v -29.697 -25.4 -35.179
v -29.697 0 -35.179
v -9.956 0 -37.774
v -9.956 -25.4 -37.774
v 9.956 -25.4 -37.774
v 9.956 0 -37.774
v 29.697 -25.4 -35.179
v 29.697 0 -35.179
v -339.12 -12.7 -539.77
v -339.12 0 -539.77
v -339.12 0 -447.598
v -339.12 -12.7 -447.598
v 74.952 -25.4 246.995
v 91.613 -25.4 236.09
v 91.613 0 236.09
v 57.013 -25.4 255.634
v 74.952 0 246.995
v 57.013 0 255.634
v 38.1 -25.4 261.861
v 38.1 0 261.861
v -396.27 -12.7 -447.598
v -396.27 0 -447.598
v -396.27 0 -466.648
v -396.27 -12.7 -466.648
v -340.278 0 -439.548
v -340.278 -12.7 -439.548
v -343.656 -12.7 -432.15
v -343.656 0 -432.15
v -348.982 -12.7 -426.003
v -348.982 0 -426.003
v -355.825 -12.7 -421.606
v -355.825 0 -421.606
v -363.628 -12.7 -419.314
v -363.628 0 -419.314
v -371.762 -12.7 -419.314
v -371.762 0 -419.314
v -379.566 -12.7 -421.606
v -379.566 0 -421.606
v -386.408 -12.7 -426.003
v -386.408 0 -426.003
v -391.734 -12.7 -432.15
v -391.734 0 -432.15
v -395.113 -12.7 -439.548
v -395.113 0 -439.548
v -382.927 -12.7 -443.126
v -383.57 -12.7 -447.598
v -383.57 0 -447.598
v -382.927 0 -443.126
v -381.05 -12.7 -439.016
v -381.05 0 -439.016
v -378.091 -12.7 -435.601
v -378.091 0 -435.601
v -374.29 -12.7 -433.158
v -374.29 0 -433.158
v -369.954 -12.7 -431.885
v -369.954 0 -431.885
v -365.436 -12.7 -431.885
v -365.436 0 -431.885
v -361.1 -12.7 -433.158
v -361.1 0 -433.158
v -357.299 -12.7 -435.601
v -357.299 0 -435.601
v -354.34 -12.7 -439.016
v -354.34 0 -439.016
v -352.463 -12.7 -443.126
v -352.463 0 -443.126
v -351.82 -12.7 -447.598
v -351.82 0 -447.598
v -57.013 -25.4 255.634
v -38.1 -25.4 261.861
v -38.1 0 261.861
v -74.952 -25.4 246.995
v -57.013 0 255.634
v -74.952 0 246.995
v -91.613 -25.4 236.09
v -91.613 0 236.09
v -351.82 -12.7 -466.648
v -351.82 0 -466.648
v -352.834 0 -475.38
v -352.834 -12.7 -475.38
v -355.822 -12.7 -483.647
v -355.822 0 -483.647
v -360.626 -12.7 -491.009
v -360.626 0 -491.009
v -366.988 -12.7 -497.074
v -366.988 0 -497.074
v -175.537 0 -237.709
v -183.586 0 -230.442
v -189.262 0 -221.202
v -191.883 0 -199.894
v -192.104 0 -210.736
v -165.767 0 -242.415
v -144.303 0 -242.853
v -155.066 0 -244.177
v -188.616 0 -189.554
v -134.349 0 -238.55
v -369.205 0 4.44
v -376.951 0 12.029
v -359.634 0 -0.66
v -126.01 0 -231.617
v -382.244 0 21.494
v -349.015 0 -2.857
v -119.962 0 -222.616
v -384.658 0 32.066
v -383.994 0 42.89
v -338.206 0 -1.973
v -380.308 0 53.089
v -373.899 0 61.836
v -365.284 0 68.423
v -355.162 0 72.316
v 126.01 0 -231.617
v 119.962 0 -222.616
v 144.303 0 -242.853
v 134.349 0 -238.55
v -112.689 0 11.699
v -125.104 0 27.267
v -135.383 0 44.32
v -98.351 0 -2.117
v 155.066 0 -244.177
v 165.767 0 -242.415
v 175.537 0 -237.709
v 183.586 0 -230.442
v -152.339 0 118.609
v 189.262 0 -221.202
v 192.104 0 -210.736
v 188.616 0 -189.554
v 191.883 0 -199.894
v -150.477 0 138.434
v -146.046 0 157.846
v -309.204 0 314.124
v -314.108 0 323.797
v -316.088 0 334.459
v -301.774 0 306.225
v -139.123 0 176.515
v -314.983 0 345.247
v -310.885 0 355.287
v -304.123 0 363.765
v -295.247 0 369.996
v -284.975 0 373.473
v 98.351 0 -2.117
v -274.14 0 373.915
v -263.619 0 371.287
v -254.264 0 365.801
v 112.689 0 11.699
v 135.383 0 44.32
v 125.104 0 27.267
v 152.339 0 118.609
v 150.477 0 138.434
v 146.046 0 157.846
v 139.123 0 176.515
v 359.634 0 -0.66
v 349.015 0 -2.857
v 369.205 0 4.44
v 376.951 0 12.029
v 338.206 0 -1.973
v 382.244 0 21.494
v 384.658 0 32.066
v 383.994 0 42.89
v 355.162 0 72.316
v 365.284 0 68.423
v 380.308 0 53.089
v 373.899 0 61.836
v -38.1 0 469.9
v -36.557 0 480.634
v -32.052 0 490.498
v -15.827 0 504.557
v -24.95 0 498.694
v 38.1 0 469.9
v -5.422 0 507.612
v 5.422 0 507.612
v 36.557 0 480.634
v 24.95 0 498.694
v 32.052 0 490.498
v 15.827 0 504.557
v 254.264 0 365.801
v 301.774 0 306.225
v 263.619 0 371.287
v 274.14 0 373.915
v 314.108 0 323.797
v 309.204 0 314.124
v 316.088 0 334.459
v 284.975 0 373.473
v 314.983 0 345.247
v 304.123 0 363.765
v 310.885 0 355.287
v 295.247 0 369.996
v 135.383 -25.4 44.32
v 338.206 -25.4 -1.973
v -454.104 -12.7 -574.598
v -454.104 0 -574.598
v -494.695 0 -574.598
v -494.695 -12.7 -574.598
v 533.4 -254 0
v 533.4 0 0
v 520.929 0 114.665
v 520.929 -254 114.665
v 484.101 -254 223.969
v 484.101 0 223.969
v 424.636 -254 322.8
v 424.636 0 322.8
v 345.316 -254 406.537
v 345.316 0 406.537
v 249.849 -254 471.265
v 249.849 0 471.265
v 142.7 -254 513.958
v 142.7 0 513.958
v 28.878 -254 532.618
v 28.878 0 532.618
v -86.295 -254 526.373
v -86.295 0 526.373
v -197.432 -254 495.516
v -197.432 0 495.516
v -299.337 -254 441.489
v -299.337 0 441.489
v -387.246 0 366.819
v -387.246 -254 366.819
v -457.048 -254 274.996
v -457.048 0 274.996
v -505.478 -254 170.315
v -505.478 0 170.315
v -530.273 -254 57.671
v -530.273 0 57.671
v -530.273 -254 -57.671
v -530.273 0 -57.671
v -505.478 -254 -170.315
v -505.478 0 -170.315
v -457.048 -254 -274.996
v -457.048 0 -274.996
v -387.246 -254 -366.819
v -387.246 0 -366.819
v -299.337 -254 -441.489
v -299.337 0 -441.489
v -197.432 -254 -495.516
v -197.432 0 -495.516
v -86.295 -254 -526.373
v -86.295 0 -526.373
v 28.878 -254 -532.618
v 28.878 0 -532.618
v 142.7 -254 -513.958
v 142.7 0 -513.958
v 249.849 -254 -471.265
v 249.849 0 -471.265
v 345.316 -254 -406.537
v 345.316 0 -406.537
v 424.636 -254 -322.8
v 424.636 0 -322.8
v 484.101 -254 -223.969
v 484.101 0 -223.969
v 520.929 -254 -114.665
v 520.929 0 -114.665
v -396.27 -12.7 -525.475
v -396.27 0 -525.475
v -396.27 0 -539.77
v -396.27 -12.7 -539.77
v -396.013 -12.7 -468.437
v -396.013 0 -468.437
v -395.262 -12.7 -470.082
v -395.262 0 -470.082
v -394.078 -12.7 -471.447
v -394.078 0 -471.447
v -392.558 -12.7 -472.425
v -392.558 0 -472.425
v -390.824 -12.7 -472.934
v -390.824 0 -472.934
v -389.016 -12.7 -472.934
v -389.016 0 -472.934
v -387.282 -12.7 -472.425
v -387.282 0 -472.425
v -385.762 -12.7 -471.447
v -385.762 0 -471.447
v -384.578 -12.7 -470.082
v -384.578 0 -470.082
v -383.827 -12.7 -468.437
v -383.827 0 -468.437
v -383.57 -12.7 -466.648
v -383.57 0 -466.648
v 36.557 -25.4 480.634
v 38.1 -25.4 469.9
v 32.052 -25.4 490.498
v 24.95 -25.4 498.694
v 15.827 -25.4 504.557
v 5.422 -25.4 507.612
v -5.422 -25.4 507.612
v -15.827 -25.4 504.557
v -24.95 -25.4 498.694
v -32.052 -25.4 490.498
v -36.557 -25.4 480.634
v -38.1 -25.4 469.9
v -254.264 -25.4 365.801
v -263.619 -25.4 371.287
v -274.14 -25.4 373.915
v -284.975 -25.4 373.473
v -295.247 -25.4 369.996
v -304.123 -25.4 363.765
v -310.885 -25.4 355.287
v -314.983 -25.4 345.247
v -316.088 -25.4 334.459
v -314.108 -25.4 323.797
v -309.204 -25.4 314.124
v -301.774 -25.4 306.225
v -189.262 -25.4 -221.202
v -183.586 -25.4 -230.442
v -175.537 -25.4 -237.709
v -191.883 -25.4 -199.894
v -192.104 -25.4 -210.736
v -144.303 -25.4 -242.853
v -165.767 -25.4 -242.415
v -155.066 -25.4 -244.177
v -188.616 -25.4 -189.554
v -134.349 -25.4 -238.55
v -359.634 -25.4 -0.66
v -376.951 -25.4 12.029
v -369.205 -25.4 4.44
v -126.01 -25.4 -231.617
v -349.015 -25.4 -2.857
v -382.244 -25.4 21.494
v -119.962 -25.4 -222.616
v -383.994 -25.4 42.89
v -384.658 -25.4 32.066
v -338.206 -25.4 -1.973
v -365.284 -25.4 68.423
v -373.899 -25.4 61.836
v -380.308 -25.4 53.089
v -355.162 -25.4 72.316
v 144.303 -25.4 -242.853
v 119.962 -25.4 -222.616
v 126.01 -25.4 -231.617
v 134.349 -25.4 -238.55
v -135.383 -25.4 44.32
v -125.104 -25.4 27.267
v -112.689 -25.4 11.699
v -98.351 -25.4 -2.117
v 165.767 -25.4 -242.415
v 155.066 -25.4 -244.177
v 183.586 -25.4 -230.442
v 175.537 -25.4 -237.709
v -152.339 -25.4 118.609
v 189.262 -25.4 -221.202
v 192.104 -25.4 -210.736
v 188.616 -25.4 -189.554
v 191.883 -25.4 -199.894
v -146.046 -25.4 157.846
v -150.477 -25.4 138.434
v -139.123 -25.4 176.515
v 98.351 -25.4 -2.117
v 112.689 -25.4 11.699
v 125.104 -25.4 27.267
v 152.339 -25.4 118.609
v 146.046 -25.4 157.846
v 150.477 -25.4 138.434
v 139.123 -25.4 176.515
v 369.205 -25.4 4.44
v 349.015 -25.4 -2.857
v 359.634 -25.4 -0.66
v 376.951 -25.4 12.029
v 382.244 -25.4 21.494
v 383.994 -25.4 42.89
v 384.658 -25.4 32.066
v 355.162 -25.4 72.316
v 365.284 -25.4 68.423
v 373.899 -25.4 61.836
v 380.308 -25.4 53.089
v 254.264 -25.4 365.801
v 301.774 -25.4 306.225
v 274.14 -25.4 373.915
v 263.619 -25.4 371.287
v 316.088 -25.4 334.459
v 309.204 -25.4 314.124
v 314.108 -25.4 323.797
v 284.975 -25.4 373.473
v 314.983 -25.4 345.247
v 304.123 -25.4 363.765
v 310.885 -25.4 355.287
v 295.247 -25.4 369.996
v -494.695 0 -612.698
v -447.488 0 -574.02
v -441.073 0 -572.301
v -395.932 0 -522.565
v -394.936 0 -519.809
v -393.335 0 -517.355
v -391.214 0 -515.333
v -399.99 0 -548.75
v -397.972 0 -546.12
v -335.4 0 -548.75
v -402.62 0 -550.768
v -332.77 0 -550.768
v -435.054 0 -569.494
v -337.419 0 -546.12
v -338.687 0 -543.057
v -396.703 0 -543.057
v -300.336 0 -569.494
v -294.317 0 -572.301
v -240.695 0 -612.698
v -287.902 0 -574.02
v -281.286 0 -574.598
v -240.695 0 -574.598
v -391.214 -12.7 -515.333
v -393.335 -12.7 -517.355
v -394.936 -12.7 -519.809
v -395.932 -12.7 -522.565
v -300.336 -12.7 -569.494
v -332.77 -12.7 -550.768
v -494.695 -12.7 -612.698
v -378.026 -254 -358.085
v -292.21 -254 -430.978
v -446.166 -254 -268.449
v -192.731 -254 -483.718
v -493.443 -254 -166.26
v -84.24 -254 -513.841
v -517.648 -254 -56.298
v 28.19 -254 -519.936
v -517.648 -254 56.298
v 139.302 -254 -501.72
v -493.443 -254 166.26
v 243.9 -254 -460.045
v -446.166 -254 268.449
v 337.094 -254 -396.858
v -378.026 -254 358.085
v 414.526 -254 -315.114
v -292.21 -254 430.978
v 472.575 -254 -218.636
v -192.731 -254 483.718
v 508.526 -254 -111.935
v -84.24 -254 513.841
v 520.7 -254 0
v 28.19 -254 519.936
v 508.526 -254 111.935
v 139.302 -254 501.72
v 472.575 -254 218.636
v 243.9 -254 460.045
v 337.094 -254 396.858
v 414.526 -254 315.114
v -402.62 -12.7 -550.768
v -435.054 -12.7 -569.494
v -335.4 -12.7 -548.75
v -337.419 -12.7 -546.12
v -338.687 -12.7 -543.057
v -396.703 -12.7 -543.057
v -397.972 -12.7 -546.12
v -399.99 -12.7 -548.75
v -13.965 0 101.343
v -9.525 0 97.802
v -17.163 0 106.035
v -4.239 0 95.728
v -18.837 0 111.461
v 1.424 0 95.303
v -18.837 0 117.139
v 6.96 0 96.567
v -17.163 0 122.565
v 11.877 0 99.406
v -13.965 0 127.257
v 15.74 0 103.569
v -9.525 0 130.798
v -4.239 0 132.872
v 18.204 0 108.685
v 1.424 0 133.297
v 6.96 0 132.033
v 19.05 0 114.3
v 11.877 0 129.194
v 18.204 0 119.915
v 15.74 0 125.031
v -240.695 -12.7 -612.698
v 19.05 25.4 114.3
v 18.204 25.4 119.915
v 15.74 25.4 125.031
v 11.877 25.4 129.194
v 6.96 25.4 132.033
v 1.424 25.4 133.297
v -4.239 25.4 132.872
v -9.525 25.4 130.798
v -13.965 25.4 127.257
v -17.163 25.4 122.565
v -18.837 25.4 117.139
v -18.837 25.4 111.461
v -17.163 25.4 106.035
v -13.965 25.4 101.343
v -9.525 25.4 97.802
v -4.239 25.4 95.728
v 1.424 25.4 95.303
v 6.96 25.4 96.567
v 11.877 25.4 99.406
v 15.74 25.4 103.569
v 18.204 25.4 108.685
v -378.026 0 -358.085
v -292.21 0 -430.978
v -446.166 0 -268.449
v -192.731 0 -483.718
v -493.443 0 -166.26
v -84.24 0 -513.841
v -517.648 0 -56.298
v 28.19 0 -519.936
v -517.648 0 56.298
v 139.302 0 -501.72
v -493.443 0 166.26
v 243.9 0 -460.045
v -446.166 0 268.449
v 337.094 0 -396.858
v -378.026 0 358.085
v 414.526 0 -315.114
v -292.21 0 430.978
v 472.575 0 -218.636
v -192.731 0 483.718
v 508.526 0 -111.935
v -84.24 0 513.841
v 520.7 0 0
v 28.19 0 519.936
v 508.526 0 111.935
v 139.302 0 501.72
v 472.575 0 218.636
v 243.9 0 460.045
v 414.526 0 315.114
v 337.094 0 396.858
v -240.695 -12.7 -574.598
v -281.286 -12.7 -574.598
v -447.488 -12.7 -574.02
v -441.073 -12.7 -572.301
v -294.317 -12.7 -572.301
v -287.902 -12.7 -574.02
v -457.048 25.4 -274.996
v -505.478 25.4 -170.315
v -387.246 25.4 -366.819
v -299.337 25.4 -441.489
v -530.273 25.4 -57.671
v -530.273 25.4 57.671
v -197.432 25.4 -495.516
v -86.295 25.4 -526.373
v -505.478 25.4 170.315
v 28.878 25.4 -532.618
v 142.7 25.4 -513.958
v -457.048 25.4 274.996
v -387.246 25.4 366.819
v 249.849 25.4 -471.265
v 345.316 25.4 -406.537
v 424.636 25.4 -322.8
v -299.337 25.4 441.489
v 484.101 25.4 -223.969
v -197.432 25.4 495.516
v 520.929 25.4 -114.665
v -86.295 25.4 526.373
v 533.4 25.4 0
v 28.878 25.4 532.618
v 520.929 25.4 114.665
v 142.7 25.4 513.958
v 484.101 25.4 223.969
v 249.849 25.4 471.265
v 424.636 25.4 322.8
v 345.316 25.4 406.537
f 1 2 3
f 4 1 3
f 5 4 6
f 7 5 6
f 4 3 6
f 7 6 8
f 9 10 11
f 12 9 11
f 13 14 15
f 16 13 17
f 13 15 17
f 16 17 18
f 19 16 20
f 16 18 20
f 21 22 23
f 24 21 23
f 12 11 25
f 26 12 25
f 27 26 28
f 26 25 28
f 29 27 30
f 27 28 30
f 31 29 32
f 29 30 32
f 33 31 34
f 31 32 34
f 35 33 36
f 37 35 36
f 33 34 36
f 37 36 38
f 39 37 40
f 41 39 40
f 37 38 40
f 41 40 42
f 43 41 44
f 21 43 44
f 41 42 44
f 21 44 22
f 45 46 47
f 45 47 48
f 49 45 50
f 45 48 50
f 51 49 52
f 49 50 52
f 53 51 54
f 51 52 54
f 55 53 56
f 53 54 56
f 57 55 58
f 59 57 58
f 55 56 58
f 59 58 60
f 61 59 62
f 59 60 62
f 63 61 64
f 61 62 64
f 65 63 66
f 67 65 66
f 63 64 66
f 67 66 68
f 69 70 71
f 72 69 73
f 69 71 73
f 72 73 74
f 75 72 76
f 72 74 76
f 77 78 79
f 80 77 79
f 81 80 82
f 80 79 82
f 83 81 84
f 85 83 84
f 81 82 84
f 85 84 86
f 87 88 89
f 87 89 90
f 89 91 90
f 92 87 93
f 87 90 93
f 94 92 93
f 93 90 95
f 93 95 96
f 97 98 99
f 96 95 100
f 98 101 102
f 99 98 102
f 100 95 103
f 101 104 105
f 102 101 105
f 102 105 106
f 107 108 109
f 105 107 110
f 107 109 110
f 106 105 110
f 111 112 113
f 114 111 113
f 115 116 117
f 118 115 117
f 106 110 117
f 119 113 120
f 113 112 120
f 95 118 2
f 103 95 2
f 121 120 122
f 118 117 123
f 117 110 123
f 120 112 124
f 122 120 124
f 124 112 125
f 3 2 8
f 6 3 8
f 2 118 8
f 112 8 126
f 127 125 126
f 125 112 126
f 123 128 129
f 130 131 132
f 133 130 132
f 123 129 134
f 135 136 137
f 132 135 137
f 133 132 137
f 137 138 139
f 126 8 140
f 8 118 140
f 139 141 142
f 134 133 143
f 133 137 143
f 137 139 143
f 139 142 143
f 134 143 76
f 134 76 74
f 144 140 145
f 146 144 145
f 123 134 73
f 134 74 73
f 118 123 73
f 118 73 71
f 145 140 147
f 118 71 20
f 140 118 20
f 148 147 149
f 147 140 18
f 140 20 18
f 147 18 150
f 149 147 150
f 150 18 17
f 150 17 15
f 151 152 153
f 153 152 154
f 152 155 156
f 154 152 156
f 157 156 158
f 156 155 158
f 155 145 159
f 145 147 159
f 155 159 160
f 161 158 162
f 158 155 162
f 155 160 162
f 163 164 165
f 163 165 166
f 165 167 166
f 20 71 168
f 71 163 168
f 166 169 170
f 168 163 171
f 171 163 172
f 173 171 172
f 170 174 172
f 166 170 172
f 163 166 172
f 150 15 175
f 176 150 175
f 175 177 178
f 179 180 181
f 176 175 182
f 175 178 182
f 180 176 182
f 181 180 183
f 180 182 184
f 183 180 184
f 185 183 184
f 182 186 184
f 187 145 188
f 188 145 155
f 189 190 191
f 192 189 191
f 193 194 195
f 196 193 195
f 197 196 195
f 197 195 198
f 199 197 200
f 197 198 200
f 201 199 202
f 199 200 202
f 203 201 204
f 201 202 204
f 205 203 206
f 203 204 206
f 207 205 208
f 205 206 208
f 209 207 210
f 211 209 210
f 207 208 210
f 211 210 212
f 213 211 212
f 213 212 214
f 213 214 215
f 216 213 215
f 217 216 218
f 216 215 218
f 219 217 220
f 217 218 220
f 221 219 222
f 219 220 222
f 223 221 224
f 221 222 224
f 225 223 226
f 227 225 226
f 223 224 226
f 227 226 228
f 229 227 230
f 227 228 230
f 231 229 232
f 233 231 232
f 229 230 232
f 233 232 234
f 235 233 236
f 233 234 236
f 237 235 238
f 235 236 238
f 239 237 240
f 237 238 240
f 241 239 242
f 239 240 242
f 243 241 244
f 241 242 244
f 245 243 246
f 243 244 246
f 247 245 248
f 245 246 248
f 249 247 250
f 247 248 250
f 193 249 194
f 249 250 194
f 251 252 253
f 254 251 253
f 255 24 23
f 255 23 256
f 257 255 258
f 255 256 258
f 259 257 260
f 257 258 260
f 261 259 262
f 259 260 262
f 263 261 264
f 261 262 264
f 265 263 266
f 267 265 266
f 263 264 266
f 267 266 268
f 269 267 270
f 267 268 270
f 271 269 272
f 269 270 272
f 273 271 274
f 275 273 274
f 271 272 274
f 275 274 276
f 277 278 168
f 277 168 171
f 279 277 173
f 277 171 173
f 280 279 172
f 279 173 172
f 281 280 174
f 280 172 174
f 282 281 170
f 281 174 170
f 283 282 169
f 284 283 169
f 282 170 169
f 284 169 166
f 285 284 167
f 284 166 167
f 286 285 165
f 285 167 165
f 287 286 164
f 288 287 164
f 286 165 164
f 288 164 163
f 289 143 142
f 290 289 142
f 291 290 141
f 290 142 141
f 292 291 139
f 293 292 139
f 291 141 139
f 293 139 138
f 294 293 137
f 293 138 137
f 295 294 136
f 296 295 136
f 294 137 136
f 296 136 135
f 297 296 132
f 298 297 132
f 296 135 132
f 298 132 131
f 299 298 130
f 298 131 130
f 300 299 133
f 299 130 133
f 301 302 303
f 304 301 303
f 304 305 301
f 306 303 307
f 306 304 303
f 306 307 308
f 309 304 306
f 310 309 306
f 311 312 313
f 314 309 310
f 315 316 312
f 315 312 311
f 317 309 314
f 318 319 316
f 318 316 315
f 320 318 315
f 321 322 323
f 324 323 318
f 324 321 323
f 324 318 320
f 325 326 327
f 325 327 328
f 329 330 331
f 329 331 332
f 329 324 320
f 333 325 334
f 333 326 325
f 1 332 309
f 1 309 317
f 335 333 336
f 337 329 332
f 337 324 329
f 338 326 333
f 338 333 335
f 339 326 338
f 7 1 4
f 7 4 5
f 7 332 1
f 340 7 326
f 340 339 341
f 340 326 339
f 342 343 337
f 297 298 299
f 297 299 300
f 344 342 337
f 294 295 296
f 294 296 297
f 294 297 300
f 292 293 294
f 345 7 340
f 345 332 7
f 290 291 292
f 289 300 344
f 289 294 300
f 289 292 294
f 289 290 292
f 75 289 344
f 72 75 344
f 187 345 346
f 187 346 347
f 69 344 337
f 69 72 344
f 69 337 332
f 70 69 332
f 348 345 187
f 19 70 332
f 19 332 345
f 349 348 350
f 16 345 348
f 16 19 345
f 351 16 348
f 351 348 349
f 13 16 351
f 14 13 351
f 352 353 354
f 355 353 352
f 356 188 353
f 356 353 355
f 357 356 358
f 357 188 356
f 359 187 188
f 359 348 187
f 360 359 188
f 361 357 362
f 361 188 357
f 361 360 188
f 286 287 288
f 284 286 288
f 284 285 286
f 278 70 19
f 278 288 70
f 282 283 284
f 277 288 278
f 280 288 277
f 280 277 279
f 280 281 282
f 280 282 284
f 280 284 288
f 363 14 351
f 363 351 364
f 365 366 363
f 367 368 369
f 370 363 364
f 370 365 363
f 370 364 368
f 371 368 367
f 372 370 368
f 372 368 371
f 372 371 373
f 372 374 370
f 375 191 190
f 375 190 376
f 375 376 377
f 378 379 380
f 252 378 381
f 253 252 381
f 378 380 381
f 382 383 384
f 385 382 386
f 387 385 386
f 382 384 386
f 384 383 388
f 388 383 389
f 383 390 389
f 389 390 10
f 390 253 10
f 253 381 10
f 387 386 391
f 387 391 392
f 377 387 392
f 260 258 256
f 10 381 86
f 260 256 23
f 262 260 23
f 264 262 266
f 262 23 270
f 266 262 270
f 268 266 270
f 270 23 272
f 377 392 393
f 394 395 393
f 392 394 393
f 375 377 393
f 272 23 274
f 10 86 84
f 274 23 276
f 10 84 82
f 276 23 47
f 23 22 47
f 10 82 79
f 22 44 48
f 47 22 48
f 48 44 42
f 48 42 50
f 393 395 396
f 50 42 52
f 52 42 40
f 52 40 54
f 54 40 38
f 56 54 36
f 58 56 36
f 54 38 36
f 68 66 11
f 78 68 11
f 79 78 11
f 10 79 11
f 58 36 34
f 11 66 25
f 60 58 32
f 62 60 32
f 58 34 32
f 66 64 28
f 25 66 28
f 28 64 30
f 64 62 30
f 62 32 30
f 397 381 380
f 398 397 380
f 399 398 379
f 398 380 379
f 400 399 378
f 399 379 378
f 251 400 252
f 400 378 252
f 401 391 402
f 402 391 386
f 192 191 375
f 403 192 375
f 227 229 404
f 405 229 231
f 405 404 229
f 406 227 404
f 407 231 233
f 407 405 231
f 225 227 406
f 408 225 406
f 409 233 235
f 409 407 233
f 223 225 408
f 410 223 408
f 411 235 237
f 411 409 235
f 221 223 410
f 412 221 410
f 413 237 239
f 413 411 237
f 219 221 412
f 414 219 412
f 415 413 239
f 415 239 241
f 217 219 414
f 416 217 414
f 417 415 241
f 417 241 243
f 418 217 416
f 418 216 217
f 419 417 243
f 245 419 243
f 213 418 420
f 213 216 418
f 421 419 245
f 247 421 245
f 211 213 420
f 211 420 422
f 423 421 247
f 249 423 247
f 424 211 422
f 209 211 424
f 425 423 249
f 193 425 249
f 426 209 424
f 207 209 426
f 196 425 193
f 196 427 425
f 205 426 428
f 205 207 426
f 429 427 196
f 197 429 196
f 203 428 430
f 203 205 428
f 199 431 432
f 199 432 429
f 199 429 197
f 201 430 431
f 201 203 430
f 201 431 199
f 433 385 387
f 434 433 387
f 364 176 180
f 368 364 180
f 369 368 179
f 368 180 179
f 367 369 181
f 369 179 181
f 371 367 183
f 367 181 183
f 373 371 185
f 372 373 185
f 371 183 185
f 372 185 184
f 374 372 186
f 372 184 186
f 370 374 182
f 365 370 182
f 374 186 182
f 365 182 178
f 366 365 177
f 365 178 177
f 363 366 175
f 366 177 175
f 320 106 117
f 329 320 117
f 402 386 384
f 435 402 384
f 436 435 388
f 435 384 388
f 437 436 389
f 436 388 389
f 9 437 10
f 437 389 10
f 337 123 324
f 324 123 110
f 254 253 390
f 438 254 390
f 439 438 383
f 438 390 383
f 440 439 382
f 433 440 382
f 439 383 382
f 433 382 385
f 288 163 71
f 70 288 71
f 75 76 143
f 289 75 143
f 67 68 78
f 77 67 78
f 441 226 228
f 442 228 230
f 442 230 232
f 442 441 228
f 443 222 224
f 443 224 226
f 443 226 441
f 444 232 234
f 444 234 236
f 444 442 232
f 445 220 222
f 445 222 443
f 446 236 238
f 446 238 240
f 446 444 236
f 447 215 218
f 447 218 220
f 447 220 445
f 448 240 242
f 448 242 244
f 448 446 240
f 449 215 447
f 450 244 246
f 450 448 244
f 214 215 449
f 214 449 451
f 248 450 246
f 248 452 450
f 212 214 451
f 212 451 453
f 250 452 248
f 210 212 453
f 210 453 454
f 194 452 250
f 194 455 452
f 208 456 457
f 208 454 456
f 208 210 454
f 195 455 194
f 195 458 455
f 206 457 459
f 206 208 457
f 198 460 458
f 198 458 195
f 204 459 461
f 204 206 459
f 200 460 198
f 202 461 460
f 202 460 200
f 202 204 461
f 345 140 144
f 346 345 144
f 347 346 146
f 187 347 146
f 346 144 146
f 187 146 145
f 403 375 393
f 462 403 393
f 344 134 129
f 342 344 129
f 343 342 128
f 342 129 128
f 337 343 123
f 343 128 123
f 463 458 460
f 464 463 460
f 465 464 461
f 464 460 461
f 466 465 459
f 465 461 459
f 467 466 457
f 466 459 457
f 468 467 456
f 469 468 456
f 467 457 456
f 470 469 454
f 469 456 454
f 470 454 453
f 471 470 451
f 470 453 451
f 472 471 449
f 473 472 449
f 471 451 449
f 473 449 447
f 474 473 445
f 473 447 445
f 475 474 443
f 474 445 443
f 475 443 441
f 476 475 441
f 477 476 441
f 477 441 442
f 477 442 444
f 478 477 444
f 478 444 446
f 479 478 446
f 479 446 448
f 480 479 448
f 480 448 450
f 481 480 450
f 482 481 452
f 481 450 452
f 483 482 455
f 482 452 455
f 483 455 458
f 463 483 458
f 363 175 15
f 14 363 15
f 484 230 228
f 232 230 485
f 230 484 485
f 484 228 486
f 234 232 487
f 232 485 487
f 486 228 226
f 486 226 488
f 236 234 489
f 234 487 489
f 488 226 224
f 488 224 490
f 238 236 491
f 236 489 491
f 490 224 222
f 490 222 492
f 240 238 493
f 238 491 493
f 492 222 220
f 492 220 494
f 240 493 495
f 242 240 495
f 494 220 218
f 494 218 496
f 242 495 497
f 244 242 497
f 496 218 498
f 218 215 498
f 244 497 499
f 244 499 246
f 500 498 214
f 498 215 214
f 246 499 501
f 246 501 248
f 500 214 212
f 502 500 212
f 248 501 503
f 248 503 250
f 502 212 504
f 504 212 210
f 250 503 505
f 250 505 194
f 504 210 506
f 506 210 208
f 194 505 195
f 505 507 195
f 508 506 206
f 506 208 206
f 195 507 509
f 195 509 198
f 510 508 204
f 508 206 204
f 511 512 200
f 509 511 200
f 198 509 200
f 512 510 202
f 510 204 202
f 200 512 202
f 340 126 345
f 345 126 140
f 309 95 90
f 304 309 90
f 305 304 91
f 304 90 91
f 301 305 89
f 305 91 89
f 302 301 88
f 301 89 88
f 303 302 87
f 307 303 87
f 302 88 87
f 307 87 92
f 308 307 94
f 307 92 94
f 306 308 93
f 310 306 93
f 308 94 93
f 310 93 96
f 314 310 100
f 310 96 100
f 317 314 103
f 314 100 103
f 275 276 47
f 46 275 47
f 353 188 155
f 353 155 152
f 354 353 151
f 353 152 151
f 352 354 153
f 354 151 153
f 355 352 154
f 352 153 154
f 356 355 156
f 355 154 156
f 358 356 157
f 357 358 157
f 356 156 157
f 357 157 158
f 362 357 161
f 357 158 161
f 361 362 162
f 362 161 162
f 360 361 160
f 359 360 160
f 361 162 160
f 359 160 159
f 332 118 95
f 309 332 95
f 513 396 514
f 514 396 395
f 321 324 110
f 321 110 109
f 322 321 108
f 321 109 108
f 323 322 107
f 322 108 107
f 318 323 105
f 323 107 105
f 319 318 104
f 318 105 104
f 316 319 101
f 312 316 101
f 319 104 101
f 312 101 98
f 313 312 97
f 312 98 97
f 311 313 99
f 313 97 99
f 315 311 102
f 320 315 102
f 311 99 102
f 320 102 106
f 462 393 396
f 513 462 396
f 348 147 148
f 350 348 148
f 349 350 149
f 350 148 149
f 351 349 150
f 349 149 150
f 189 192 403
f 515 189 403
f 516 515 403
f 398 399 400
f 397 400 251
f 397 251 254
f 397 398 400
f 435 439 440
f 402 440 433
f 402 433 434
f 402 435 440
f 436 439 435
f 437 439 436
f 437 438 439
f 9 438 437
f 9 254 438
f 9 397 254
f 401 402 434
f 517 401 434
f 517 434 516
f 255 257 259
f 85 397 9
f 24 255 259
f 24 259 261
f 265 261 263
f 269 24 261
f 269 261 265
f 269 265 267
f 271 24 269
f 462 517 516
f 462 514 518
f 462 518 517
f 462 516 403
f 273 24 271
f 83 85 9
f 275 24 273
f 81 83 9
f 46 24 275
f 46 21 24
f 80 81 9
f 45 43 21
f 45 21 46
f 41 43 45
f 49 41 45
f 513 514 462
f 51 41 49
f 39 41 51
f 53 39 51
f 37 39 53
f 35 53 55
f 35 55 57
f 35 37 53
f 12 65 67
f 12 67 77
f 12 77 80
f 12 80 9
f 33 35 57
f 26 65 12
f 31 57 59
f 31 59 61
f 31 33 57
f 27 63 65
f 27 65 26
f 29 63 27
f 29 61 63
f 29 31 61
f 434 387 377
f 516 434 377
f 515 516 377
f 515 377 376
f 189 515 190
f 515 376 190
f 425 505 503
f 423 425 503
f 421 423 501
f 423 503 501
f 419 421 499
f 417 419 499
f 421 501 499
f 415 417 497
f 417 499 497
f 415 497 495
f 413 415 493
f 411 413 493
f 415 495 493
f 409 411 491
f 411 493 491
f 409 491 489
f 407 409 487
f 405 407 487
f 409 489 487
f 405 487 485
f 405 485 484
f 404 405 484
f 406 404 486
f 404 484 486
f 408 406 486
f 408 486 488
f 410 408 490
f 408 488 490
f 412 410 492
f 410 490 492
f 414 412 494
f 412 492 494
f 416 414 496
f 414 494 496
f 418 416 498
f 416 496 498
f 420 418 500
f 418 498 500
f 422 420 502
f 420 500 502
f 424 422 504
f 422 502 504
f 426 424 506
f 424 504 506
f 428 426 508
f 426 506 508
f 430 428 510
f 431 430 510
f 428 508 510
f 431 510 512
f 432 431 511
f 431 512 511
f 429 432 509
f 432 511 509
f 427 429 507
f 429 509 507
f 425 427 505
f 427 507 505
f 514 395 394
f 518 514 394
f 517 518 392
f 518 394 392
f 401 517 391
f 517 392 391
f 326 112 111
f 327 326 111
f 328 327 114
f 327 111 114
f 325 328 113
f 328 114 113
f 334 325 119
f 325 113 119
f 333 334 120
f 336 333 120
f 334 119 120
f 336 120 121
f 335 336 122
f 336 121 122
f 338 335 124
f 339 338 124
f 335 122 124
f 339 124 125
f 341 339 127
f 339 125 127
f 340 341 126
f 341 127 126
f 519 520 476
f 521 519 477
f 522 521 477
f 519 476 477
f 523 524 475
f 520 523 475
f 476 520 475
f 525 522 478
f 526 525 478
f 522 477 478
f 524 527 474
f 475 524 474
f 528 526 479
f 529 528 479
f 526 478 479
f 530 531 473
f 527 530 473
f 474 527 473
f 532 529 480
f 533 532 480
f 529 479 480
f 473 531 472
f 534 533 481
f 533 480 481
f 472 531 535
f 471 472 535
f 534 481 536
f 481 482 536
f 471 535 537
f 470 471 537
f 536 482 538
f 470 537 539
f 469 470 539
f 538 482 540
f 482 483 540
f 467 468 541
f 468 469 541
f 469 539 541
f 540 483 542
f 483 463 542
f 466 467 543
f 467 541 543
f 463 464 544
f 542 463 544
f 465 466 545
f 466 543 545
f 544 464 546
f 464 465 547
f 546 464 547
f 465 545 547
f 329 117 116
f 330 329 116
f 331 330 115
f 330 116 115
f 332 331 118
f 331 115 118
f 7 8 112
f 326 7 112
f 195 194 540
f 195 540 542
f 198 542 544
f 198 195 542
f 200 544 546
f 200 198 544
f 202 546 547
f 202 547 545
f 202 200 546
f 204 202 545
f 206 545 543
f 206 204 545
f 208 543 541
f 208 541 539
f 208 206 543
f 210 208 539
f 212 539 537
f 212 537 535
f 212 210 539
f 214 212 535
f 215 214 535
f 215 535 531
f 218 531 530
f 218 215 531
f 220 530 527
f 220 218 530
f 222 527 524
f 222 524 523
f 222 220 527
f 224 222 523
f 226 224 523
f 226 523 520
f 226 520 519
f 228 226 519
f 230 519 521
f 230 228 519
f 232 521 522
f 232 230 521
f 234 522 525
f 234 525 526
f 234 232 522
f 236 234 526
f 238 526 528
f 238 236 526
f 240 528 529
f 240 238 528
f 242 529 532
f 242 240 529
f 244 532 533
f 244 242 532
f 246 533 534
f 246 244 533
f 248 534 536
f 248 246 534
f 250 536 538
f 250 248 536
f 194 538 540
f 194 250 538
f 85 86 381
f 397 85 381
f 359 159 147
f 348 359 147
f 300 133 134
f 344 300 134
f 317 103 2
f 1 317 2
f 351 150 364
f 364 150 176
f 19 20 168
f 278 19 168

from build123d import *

# Parameters (mm, degrees)
F2_DEPTH = 254
F3_DEPTH = 25.4
F4_R     = 533.4
F4_R_2   = 19.05
F5_DEPTH = 25.4
F7_DEPTH = 12.7


with BuildPart() as f2:
    # F0 (on Front) → F2 (new body)
    with BuildSketch(Plane.XZ):
        with BuildLine():
            ThreePointArc((-533.4, 0), (0, -533.4), (533.4, 0))
            ThreePointArc((533.4, 0), (0, 533.4), (-533.4, 0))
        make_face()
        with BuildLine():
            ThreePointArc((-520.7, 0), (0, 520.7), (520.7, 0))
            ThreePointArc((520.7, 0), (0, -520.7), (-520.7, 0))
        make_face(mode=Mode.SUBTRACT)
    extrude(amount=F2_DEPTH)


with BuildPart() as f3:
    # F1 (on Front) → F3 (new body)
    with BuildSketch(Plane.XZ):
        with BuildLine():
            Line((-301.774237, 306.225194), (-139.122535, 176.514791))
            ThreePointArc((-139.122535, 176.514791), (-148.579014, 148.21219), (-152.339059, 118.609416))
            Line((-152.339059, 118.609416), (-355.162413, 72.316309))
            ThreePointArc((-355.162413, 72.316309), (-383.829119, 26.693508), (-338.206318, -1.973198))
            Line((-338.206318, -1.973198), (-135.382964, 44.319909))
            ThreePointArc((-135.382964, 44.319909), (-119.151118, 19.280154), (-98.351087, -2.116595))
            Line((-98.351087, -2.116595), (-188.615971, -189.553559))
            ThreePointArc((-188.615971, -189.553559), (-170.820028, -240.411443), (-119.962144, -222.6155))
            Line((-119.962144, -222.6155), (-29.697259, -35.178536))
            ThreePointArc((-29.697259, -35.178536), (0, -38.1), (29.697259, -35.178536))
            Line((29.697259, -35.178536), (119.962144, -222.6155))
            ThreePointArc((119.962144, -222.6155), (170.820028, -240.411443), (188.615971, -189.553559))
            Line((188.615971, -189.553559), (98.351087, -2.116595))
            ThreePointArc((98.351087, -2.116595), (119.151118, 19.280154), (135.382964, 44.319909))
            Line((135.382964, 44.319909), (338.206318, -1.973198))
            ThreePointArc((338.206318, -1.973198), (383.829119, 26.693508), (355.162413, 72.316309))
            Line((355.162413, 72.316309), (152.339059, 118.609416))
            ThreePointArc((152.339059, 118.609416), (148.579014, 148.21219), (139.122535, 176.514791))
            Line((139.122535, 176.514791), (301.774237, 306.225194))
            ThreePointArc((301.774237, 306.225194), (307.807055, 359.767935), (254.264314, 365.800753))
            Line((254.264314, 365.800753), (91.612612, 236.09035))
            ThreePointArc((91.612612, 236.09035), (66.123882, 251.607655), (38.1, 261.860665))
            Line((38.1, 261.860665), (38.1, 469.9))
            ThreePointArc((38.1, 469.9), (0, 508), (-38.1, 469.9))
            Line((-38.1, 469.9), (-38.1, 261.860665))
            ThreePointArc((-38.1, 261.860665), (-66.123882, 251.607655), (-91.612612, 236.09035))
            Line((-91.612612, 236.09035), (-254.264314, 365.800753))
            ThreePointArc((-254.264314, 365.800753), (-307.807055, 359.767935), (-301.774237, 306.225194))
        make_face()
    extrude(amount=F3_DEPTH)


with BuildPart() as f5:
    # F4 (on Front) → F5 (new body)
    with BuildSketch(Plane.XZ):
        Circle(F4_R)
        with Locations((0, 114.3)):
            Circle(F4_R_2, mode=Mode.SUBTRACT)
    extrude(amount=-F5_DEPTH)


with BuildPart() as f7:
    # F6 (on Front) → F7 (new body)
    with BuildSketch(Plane.XZ):
        with BuildLine():
            ThreePointArc((-383.570089, -447.598445), (-367.695089, -431.723445), (-351.820089, -447.598445))
            Line((-351.820089, -447.598445), (-351.820089, -466.648445))
            ThreePointArc((-351.820089, -466.648445), (-355.822294, -483.646987), (-366.98809, -497.074313))
            Line((-366.98809, -497.074313), (-391.214088, -515.333466))
            ThreePointArc((-391.214088, -515.333466), (-394.93602, -519.809241), (-396.270089, -525.475422))
            Line((-396.270089, -525.475422), (-396.270089, -539.76979))
            ThreePointArc((-396.270089, -539.76979), (-397.971566, -546.11979), (-402.620089, -550.768313))
            Line((-402.620089, -550.768313), (-435.053953, -569.494013))
            ThreePointArc((-435.053953, -569.494013), (-444.242947, -573.300219), (-454.103953, -574.598445))
            Line((-454.103953, -574.598445), (-494.695089, -574.598445))
            Line((-494.695089, -574.598445), (-494.695089, -612.698445))
            Line((-494.695089, -612.698445), (-240.695089, -612.698445))
            Line((-240.695089, -612.698445), (-240.695089, -574.598445))
            Line((-240.695089, -574.598445), (-281.286224, -574.598445))
            ThreePointArc((-281.286224, -574.598445), (-291.14723, -573.300219), (-300.336224, -569.494013))
            Line((-300.336224, -569.494013), (-332.770089, -550.768313))
            ThreePointArc((-332.770089, -550.768313), (-337.418611, -546.11979), (-339.120089, -539.76979))
            Line((-339.120089, -539.76979), (-339.120089, -447.598445))
            ThreePointArc((-339.120089, -447.598445), (-367.695089, -419.023445), (-396.270089, -447.598445))
            Line((-396.270089, -447.598445), (-396.270089, -466.648445))
            ThreePointArc((-396.270089, -466.648445), (-389.920089, -472.998445), (-383.570089, -466.648445))
            Line((-383.570089, -466.648445), (-383.570089, -447.598445))
        make_face()
    extrude(amount=F7_DEPTH)


solid = Compound([f2.part, f3.part, f5.part, f7.part])
